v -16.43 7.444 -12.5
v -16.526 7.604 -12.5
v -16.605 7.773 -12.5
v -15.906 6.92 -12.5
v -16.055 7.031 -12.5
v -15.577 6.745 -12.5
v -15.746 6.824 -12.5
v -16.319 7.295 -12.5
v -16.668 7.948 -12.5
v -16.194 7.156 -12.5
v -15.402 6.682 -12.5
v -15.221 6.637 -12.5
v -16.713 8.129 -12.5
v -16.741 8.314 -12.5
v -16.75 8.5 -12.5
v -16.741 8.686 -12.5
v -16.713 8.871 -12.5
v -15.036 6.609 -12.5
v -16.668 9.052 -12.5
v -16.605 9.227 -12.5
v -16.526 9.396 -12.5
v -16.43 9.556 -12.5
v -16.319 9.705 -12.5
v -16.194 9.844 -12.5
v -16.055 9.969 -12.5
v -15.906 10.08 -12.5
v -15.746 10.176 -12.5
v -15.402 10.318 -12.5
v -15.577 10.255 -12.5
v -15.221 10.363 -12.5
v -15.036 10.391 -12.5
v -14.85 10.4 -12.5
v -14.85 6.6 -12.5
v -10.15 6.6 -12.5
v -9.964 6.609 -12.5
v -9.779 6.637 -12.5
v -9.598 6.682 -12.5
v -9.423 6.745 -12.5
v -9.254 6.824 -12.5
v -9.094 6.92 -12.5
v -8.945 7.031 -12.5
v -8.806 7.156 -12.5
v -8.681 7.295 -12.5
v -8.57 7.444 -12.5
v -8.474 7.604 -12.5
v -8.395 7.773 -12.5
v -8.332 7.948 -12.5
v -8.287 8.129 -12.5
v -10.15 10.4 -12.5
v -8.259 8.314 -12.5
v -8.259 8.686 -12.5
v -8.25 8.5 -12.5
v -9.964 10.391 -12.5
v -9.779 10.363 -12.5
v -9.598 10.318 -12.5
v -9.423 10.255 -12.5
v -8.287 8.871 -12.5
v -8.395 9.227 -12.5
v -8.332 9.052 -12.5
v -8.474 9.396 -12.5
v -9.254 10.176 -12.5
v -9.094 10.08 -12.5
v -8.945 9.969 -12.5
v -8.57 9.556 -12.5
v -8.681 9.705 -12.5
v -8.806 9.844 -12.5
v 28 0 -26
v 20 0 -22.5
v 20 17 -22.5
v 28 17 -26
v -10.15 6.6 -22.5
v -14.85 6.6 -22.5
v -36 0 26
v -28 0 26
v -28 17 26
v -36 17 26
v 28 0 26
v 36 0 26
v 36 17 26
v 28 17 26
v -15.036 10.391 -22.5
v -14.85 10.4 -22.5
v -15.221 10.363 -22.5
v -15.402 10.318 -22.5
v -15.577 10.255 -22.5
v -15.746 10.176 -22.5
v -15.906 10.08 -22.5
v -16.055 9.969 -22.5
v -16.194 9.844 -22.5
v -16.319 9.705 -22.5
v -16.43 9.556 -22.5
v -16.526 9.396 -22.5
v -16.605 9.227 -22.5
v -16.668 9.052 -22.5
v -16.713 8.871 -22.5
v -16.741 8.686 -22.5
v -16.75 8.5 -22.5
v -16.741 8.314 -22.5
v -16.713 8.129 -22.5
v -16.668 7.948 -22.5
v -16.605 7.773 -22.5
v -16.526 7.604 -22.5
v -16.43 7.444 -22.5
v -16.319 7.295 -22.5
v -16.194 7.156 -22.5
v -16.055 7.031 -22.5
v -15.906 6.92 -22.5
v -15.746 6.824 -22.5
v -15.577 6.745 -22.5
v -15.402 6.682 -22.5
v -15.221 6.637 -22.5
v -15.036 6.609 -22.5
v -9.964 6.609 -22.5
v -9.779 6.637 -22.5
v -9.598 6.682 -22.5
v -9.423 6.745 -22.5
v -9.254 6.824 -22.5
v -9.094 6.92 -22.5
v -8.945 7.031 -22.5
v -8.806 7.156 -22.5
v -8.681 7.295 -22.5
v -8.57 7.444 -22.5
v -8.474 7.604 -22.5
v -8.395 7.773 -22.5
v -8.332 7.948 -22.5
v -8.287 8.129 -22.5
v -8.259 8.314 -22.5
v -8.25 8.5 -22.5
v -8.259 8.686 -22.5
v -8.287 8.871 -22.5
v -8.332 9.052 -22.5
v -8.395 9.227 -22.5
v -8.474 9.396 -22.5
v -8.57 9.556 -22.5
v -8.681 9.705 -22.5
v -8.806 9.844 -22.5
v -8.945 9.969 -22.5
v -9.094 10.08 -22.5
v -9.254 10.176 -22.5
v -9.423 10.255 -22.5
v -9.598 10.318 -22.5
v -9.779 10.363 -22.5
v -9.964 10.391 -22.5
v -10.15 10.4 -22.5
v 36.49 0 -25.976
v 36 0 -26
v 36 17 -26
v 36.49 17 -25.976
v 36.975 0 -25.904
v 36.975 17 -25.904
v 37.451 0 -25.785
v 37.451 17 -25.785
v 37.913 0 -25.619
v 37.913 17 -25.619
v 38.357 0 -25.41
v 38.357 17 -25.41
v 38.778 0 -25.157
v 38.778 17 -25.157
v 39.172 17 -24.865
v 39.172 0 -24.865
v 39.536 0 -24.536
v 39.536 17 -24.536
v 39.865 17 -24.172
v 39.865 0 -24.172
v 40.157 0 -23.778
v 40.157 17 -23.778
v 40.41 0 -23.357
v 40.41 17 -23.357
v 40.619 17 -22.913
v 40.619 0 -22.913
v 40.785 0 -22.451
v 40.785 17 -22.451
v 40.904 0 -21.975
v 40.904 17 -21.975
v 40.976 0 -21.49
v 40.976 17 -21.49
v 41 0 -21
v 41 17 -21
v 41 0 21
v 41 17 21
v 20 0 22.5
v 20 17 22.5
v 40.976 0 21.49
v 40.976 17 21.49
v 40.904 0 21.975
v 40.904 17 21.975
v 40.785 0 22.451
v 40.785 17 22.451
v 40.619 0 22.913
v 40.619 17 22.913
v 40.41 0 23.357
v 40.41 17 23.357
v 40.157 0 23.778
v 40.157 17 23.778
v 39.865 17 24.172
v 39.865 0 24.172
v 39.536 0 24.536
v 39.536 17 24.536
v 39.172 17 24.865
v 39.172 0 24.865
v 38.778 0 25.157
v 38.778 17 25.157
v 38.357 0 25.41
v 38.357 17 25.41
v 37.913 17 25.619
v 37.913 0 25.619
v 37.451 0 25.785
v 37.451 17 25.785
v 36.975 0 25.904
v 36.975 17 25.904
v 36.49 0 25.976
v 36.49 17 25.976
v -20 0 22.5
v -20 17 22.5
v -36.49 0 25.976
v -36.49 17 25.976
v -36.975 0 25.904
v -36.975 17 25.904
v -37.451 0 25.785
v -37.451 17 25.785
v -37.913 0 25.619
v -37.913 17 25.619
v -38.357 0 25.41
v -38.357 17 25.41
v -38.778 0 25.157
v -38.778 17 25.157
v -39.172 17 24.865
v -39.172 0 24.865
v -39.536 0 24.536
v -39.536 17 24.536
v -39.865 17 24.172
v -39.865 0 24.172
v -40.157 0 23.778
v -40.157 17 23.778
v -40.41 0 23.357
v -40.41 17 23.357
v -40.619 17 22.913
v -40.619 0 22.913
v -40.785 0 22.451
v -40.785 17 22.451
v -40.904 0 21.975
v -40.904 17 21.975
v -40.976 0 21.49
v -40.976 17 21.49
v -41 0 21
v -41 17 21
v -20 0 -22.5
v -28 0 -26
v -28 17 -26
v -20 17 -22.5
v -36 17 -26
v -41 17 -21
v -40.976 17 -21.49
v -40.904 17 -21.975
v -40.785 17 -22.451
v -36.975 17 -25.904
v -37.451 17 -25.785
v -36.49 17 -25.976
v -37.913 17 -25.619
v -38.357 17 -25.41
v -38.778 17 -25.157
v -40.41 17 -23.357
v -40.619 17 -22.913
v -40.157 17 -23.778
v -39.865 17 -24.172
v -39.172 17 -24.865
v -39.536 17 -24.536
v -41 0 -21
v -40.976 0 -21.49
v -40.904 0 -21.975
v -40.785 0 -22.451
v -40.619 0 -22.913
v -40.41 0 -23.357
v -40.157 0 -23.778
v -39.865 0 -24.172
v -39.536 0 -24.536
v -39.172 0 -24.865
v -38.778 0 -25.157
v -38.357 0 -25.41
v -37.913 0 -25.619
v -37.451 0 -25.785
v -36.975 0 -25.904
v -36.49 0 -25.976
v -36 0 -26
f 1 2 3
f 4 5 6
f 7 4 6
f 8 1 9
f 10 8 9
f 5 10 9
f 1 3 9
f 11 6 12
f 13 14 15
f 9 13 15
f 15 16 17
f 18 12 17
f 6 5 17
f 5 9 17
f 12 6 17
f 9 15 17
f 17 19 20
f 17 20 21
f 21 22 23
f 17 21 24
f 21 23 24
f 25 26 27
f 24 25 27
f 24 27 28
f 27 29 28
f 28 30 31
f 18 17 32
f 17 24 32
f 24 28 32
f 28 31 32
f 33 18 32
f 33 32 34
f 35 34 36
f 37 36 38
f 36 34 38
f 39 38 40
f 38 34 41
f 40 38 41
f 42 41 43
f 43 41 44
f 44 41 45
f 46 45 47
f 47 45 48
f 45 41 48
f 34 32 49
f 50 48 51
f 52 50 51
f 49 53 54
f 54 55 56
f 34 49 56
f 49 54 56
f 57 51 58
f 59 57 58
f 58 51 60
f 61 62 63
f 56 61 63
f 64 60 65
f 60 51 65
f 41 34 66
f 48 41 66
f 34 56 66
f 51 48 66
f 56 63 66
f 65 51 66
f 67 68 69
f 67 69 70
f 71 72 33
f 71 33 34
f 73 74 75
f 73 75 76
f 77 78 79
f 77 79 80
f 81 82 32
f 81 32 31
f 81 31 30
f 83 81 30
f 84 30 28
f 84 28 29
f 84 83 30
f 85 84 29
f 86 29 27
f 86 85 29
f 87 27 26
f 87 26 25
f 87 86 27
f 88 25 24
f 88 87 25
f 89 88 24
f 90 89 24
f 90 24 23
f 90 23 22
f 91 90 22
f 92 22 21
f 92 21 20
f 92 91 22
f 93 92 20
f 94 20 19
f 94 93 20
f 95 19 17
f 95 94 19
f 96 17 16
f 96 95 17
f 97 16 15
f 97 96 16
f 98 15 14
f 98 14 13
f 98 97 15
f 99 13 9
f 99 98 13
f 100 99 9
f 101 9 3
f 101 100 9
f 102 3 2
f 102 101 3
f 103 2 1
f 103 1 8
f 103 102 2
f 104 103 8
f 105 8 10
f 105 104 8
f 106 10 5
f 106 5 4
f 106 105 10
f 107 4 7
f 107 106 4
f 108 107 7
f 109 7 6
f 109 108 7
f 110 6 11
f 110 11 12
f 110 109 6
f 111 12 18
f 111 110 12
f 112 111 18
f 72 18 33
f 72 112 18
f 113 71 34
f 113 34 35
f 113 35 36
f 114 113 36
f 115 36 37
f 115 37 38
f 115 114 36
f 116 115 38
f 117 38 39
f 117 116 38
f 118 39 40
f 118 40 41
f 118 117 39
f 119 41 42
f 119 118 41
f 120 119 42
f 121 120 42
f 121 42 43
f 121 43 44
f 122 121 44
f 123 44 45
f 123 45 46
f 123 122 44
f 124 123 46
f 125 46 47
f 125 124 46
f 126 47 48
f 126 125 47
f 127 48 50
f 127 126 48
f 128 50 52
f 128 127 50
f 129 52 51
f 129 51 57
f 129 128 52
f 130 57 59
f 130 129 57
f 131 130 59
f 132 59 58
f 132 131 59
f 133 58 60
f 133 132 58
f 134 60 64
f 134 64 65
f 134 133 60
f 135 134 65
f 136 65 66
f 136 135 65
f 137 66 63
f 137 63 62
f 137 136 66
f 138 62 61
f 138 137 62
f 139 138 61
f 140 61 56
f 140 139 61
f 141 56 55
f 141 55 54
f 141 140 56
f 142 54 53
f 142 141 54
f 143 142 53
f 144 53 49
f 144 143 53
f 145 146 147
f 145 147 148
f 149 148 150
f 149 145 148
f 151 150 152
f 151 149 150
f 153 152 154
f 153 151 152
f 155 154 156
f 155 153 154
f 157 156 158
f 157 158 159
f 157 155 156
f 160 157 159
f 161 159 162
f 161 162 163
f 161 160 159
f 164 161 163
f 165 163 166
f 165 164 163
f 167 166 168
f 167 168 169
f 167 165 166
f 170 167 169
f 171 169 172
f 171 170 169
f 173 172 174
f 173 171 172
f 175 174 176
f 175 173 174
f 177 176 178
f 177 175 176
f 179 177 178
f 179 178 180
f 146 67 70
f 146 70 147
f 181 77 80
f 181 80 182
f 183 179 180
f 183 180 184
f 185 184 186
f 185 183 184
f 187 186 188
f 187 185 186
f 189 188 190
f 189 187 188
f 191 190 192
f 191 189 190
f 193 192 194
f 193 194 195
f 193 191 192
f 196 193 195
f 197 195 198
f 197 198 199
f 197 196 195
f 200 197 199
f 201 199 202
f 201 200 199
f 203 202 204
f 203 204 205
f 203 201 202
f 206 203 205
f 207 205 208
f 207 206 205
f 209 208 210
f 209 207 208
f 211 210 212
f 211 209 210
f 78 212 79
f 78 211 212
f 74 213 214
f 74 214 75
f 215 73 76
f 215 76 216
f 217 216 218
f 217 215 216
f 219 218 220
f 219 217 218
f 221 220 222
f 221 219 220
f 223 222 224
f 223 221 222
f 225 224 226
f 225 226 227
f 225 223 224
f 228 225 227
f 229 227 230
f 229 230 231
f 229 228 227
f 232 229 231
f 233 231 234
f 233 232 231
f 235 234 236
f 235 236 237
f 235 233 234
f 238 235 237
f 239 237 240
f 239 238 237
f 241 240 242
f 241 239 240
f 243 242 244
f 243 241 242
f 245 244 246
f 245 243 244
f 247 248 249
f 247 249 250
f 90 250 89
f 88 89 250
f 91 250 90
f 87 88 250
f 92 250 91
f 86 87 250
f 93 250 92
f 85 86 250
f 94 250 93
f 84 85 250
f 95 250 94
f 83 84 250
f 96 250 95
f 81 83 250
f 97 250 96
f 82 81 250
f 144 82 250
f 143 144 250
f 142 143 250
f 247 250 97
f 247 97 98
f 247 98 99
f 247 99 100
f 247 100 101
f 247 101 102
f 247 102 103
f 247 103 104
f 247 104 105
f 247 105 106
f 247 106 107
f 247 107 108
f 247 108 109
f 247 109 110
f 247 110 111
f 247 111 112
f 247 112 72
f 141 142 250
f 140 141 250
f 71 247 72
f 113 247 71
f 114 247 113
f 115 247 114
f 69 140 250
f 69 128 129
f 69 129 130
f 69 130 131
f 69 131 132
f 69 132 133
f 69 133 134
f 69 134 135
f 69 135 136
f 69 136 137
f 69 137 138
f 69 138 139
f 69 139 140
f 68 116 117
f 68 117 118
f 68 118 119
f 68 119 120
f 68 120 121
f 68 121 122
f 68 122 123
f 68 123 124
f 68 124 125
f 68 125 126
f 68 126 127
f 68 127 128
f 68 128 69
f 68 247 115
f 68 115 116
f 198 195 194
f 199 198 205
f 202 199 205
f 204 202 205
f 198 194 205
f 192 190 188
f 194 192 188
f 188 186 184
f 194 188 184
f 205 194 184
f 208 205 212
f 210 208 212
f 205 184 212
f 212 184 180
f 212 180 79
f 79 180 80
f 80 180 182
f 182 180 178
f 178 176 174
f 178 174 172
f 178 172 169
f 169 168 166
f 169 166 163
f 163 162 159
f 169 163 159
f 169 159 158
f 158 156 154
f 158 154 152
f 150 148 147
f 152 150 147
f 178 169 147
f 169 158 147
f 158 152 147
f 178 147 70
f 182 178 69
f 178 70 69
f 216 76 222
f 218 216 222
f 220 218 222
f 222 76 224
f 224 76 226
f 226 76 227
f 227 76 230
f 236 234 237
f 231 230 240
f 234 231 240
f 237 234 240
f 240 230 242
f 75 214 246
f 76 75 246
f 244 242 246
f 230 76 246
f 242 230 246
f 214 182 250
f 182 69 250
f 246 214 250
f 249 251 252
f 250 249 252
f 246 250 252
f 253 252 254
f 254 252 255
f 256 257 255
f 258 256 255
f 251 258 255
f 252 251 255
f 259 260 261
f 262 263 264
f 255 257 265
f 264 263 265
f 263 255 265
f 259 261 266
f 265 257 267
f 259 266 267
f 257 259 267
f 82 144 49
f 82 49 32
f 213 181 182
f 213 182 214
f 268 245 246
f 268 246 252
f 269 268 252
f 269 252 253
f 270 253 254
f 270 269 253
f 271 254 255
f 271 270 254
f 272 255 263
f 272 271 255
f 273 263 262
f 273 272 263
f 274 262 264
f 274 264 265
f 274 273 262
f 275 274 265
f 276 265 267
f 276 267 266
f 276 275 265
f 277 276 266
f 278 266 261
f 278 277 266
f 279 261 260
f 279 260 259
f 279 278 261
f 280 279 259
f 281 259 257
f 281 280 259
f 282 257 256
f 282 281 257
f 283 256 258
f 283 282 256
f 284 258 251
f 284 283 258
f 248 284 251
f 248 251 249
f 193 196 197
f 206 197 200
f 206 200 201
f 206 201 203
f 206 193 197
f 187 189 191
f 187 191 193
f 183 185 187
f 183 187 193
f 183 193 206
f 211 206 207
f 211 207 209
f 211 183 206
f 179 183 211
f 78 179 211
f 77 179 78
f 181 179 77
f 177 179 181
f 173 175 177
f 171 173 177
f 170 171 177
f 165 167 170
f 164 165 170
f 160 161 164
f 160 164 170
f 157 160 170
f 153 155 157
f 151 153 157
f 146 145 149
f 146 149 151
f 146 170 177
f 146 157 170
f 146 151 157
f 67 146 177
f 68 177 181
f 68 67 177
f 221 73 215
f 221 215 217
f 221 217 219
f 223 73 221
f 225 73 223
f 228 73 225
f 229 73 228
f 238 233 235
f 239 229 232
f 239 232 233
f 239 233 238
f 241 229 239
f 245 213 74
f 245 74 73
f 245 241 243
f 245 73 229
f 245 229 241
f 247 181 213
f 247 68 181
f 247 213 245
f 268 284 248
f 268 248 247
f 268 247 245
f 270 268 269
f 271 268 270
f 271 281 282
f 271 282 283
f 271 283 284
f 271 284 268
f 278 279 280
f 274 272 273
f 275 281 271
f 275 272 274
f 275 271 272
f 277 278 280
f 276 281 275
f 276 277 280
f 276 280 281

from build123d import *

# Parameters (mm, degrees)
EXTRUDE_1_DEPTH     = 17
CUT_EXTRUDE_1_DEPTH = 10


with BuildPart() as part:
    # 草圖1 → 填料-伸長1 (new body)
    with BuildSketch(Plane(origin=(0, 0, 0), x_dir=(1, 0, 0), z_dir=(0, 1, 0))):
        with BuildLine():
            Line((28, 26), (36, 26))
            ThreePointArc((36, 26), (39.535533906, 24.535533906), (41, 21))
            Line((41, 21), (41, -21))
            ThreePointArc((41, -21), (39.535533906, -24.535533906), (36, -26))
            Line((36, -26), (28, -26))
            Line((28, -26), (20, -22.5))
            Line((20, -22.5), (-20, -22.5))
            Line((-20, -22.5), (-28, -26))
            Line((-28, -26), (-36, -26))
            ThreePointArc((-36, -26), (-39.535533906, -24.535533906), (-41, -21))
            Line((-41, -21), (-41, 21))
            ThreePointArc((-41, 21), (-39.535533906, 24.535533906), (-36, 26))
            Line((-36, 26), (-28, 26))
            Line((-28, 26), (-20, 22.5))
            Line((-20, 22.5), (20, 22.5))
            Line((20, 22.5), (28, 26))
        make_face()
    extrude(amount=EXTRUDE_1_DEPTH)

    # 草圖2 → 除料-伸長1 (cut)
    with BuildSketch(Plane(origin=(0, 0, -22.5), x_dir=(-1, 0, 0), z_dir=(0, 0, -1))):
        with BuildLine():
            Line((14.85, 6.6), (10.15, 6.6))
            ThreePointArc((10.15, 6.6), (8.25, 8.5), (10.15, 10.4))
            Line((10.15, 10.4), (14.85, 10.4))
            ThreePointArc((14.85, 10.4), (16.75, 8.5), (14.85, 6.6))
        make_face()
    extrude(amount=-CUT_EXTRUDE_1_DEPTH, mode=Mode.SUBTRACT)


solid = part.part
